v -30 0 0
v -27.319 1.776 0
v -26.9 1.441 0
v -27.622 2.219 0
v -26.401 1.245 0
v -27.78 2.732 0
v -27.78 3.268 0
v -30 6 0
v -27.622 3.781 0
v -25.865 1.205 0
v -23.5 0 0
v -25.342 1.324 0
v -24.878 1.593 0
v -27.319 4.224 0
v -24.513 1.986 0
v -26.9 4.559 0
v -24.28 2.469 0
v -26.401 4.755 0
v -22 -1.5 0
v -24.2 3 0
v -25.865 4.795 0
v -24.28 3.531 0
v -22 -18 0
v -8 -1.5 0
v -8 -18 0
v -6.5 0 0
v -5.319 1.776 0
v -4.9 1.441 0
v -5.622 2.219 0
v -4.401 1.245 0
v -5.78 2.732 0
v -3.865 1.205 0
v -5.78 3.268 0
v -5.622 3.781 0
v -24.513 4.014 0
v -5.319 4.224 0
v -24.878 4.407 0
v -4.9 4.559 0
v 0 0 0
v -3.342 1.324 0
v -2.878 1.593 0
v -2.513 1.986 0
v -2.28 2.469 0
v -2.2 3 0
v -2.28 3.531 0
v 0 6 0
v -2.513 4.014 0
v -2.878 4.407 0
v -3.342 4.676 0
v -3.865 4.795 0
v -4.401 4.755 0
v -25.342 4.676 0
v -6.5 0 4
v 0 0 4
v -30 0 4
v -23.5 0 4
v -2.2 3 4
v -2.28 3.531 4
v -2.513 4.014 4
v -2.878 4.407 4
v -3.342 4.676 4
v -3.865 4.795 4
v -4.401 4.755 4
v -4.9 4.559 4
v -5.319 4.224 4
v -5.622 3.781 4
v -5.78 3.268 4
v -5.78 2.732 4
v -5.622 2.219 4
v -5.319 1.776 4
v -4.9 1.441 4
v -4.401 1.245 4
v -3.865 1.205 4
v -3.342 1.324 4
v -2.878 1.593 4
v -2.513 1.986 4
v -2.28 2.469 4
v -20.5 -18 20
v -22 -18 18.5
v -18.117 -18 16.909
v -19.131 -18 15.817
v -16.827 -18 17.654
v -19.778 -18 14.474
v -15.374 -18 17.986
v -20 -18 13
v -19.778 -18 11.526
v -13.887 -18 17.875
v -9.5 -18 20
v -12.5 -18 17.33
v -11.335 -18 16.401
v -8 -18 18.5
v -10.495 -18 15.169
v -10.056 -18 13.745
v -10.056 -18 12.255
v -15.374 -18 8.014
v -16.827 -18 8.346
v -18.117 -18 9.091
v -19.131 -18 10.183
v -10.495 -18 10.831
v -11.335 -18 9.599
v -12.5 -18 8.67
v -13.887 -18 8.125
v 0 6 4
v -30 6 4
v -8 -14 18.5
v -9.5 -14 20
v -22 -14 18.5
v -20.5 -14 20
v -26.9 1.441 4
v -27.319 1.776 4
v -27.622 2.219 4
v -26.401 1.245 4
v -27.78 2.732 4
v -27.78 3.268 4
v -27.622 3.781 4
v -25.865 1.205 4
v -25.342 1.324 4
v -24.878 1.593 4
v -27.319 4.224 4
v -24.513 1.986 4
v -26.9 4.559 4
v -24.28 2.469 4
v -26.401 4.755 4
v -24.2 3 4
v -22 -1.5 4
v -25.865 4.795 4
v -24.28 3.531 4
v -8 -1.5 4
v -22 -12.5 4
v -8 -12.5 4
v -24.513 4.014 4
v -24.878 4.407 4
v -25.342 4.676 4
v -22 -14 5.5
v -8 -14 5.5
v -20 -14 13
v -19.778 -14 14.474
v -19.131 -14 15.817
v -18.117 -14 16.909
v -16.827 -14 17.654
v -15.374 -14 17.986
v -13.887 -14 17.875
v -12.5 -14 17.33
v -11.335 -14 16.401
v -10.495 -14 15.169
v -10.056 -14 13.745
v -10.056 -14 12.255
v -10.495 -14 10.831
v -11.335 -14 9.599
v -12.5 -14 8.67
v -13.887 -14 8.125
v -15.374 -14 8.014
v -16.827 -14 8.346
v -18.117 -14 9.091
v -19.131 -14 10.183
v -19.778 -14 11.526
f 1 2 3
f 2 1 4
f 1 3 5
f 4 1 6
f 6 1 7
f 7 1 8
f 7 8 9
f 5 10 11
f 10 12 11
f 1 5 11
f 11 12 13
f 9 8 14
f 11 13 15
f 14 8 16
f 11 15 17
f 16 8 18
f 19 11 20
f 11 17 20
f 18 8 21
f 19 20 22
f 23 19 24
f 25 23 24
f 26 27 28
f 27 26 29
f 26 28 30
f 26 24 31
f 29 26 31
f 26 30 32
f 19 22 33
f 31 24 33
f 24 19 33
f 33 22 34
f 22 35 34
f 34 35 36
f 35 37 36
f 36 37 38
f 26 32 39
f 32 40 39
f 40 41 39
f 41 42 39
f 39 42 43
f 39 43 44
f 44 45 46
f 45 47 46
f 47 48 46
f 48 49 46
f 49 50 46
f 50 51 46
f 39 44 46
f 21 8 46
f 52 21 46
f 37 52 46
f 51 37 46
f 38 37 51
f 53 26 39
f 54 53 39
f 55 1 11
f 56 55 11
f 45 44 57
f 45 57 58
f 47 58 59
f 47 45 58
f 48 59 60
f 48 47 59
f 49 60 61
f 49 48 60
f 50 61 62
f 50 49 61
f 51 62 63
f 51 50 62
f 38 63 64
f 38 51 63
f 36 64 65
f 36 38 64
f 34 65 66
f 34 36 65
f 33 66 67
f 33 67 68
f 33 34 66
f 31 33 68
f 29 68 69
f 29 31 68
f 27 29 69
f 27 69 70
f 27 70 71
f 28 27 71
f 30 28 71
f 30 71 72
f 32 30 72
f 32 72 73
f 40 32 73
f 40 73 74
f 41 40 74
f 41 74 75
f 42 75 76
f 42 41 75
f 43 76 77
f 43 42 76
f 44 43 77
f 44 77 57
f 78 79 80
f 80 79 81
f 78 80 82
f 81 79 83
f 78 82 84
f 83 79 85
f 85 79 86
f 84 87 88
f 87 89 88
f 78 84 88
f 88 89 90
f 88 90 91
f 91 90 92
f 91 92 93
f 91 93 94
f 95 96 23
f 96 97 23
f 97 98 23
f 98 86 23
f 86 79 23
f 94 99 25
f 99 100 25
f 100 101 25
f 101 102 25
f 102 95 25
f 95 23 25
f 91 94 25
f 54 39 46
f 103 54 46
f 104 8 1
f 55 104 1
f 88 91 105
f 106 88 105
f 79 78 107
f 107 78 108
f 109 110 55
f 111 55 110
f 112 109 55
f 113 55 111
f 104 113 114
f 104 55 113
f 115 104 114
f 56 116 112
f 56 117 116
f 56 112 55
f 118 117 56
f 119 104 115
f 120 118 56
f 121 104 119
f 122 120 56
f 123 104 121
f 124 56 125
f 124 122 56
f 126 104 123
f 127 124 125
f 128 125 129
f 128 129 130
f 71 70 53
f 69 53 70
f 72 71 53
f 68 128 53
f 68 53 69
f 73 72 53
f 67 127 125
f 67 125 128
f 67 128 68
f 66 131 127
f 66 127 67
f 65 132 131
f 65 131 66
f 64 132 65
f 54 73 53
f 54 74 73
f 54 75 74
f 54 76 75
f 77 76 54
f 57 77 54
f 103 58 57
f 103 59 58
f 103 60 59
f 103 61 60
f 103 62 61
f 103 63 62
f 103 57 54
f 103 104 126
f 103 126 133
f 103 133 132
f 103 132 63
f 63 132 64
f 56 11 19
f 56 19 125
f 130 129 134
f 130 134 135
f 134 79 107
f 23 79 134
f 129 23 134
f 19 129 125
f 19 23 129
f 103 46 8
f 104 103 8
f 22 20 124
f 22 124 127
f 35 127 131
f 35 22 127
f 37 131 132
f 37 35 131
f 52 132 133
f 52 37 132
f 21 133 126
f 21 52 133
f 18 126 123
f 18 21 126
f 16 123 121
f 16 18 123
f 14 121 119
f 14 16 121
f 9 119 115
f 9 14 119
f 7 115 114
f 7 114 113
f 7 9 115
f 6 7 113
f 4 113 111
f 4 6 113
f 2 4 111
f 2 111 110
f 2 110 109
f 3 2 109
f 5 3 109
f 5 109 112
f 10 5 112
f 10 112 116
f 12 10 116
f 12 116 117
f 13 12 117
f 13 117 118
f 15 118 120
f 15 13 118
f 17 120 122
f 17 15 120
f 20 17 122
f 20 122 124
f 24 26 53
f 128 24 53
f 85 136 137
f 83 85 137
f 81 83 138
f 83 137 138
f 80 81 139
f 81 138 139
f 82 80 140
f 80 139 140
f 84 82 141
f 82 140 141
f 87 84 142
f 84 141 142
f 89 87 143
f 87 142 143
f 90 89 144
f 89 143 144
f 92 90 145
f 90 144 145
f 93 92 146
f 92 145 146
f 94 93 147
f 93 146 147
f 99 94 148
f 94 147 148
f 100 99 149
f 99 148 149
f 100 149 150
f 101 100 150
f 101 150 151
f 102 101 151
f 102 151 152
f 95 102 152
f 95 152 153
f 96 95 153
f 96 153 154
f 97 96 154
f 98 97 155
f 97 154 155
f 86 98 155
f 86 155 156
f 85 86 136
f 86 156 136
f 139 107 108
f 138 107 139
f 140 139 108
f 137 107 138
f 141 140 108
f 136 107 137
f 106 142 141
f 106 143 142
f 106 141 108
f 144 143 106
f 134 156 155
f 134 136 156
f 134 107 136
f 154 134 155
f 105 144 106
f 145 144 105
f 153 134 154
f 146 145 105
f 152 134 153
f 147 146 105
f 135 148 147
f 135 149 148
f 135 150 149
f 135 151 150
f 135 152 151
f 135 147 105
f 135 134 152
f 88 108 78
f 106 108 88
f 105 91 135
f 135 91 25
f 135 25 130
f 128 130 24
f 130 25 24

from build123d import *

# Parameters (mm, degrees)
F0_R     = 1.8
F0_W     = 14
F0_H     = 14
F1_DEPTH = 4
F0_H_2   = 4
F2_DEPTH = 20
F3_R     = 5
F4_DEPTH = 4
F5_SIZE  = 1.5


with BuildPart() as f1:
    # F0 (on Top) → F1 (new body)
    with BuildSketch(Plane.XY):
        Polygon((0, 6), (-30, 6), (-30, 0), (-22, 0), (-8, 0), (0, 0), align=None)
        with Locations((-26, 3)):
            Circle(F0_R, mode=Mode.SUBTRACT)
        with Locations((-4, 3)):
            Circle(F0_R, mode=Mode.SUBTRACT)
        with Locations((-15, -7)):
            Rectangle(F0_W, F0_H)
    extrude(amount=F1_DEPTH)

    # F0 (on Top) → F2 (join)
    with BuildSketch(Plane.XY):
        with Locations((-15, -16)):
            Rectangle(F0_W, F0_H_2)
    extrude(amount=F2_DEPTH)

    # F3 (on face) → F4 (cut, through all)
    with BuildSketch(Plane(origin=(0, -14, 0), x_dir=(-1, 0, 0), z_dir=(0, 1, 0))):
        with Locations((15, 13)):
            Circle(F3_R)
    extrude(amount=-F4_DEPTH, mode=Mode.SUBTRACT)

    # F5
    f5_edges = [f1.edges().sort_by_distance(p)[0] for p in [
        (-15, -14, 4),
        (-22, -16, 20),
        (-8, -16, 20),
        (-22, 0, 2),
        (-8, 0, 2),
    ]]
    chamfer(f5_edges, length=F5_SIZE)


solid = f1.part
